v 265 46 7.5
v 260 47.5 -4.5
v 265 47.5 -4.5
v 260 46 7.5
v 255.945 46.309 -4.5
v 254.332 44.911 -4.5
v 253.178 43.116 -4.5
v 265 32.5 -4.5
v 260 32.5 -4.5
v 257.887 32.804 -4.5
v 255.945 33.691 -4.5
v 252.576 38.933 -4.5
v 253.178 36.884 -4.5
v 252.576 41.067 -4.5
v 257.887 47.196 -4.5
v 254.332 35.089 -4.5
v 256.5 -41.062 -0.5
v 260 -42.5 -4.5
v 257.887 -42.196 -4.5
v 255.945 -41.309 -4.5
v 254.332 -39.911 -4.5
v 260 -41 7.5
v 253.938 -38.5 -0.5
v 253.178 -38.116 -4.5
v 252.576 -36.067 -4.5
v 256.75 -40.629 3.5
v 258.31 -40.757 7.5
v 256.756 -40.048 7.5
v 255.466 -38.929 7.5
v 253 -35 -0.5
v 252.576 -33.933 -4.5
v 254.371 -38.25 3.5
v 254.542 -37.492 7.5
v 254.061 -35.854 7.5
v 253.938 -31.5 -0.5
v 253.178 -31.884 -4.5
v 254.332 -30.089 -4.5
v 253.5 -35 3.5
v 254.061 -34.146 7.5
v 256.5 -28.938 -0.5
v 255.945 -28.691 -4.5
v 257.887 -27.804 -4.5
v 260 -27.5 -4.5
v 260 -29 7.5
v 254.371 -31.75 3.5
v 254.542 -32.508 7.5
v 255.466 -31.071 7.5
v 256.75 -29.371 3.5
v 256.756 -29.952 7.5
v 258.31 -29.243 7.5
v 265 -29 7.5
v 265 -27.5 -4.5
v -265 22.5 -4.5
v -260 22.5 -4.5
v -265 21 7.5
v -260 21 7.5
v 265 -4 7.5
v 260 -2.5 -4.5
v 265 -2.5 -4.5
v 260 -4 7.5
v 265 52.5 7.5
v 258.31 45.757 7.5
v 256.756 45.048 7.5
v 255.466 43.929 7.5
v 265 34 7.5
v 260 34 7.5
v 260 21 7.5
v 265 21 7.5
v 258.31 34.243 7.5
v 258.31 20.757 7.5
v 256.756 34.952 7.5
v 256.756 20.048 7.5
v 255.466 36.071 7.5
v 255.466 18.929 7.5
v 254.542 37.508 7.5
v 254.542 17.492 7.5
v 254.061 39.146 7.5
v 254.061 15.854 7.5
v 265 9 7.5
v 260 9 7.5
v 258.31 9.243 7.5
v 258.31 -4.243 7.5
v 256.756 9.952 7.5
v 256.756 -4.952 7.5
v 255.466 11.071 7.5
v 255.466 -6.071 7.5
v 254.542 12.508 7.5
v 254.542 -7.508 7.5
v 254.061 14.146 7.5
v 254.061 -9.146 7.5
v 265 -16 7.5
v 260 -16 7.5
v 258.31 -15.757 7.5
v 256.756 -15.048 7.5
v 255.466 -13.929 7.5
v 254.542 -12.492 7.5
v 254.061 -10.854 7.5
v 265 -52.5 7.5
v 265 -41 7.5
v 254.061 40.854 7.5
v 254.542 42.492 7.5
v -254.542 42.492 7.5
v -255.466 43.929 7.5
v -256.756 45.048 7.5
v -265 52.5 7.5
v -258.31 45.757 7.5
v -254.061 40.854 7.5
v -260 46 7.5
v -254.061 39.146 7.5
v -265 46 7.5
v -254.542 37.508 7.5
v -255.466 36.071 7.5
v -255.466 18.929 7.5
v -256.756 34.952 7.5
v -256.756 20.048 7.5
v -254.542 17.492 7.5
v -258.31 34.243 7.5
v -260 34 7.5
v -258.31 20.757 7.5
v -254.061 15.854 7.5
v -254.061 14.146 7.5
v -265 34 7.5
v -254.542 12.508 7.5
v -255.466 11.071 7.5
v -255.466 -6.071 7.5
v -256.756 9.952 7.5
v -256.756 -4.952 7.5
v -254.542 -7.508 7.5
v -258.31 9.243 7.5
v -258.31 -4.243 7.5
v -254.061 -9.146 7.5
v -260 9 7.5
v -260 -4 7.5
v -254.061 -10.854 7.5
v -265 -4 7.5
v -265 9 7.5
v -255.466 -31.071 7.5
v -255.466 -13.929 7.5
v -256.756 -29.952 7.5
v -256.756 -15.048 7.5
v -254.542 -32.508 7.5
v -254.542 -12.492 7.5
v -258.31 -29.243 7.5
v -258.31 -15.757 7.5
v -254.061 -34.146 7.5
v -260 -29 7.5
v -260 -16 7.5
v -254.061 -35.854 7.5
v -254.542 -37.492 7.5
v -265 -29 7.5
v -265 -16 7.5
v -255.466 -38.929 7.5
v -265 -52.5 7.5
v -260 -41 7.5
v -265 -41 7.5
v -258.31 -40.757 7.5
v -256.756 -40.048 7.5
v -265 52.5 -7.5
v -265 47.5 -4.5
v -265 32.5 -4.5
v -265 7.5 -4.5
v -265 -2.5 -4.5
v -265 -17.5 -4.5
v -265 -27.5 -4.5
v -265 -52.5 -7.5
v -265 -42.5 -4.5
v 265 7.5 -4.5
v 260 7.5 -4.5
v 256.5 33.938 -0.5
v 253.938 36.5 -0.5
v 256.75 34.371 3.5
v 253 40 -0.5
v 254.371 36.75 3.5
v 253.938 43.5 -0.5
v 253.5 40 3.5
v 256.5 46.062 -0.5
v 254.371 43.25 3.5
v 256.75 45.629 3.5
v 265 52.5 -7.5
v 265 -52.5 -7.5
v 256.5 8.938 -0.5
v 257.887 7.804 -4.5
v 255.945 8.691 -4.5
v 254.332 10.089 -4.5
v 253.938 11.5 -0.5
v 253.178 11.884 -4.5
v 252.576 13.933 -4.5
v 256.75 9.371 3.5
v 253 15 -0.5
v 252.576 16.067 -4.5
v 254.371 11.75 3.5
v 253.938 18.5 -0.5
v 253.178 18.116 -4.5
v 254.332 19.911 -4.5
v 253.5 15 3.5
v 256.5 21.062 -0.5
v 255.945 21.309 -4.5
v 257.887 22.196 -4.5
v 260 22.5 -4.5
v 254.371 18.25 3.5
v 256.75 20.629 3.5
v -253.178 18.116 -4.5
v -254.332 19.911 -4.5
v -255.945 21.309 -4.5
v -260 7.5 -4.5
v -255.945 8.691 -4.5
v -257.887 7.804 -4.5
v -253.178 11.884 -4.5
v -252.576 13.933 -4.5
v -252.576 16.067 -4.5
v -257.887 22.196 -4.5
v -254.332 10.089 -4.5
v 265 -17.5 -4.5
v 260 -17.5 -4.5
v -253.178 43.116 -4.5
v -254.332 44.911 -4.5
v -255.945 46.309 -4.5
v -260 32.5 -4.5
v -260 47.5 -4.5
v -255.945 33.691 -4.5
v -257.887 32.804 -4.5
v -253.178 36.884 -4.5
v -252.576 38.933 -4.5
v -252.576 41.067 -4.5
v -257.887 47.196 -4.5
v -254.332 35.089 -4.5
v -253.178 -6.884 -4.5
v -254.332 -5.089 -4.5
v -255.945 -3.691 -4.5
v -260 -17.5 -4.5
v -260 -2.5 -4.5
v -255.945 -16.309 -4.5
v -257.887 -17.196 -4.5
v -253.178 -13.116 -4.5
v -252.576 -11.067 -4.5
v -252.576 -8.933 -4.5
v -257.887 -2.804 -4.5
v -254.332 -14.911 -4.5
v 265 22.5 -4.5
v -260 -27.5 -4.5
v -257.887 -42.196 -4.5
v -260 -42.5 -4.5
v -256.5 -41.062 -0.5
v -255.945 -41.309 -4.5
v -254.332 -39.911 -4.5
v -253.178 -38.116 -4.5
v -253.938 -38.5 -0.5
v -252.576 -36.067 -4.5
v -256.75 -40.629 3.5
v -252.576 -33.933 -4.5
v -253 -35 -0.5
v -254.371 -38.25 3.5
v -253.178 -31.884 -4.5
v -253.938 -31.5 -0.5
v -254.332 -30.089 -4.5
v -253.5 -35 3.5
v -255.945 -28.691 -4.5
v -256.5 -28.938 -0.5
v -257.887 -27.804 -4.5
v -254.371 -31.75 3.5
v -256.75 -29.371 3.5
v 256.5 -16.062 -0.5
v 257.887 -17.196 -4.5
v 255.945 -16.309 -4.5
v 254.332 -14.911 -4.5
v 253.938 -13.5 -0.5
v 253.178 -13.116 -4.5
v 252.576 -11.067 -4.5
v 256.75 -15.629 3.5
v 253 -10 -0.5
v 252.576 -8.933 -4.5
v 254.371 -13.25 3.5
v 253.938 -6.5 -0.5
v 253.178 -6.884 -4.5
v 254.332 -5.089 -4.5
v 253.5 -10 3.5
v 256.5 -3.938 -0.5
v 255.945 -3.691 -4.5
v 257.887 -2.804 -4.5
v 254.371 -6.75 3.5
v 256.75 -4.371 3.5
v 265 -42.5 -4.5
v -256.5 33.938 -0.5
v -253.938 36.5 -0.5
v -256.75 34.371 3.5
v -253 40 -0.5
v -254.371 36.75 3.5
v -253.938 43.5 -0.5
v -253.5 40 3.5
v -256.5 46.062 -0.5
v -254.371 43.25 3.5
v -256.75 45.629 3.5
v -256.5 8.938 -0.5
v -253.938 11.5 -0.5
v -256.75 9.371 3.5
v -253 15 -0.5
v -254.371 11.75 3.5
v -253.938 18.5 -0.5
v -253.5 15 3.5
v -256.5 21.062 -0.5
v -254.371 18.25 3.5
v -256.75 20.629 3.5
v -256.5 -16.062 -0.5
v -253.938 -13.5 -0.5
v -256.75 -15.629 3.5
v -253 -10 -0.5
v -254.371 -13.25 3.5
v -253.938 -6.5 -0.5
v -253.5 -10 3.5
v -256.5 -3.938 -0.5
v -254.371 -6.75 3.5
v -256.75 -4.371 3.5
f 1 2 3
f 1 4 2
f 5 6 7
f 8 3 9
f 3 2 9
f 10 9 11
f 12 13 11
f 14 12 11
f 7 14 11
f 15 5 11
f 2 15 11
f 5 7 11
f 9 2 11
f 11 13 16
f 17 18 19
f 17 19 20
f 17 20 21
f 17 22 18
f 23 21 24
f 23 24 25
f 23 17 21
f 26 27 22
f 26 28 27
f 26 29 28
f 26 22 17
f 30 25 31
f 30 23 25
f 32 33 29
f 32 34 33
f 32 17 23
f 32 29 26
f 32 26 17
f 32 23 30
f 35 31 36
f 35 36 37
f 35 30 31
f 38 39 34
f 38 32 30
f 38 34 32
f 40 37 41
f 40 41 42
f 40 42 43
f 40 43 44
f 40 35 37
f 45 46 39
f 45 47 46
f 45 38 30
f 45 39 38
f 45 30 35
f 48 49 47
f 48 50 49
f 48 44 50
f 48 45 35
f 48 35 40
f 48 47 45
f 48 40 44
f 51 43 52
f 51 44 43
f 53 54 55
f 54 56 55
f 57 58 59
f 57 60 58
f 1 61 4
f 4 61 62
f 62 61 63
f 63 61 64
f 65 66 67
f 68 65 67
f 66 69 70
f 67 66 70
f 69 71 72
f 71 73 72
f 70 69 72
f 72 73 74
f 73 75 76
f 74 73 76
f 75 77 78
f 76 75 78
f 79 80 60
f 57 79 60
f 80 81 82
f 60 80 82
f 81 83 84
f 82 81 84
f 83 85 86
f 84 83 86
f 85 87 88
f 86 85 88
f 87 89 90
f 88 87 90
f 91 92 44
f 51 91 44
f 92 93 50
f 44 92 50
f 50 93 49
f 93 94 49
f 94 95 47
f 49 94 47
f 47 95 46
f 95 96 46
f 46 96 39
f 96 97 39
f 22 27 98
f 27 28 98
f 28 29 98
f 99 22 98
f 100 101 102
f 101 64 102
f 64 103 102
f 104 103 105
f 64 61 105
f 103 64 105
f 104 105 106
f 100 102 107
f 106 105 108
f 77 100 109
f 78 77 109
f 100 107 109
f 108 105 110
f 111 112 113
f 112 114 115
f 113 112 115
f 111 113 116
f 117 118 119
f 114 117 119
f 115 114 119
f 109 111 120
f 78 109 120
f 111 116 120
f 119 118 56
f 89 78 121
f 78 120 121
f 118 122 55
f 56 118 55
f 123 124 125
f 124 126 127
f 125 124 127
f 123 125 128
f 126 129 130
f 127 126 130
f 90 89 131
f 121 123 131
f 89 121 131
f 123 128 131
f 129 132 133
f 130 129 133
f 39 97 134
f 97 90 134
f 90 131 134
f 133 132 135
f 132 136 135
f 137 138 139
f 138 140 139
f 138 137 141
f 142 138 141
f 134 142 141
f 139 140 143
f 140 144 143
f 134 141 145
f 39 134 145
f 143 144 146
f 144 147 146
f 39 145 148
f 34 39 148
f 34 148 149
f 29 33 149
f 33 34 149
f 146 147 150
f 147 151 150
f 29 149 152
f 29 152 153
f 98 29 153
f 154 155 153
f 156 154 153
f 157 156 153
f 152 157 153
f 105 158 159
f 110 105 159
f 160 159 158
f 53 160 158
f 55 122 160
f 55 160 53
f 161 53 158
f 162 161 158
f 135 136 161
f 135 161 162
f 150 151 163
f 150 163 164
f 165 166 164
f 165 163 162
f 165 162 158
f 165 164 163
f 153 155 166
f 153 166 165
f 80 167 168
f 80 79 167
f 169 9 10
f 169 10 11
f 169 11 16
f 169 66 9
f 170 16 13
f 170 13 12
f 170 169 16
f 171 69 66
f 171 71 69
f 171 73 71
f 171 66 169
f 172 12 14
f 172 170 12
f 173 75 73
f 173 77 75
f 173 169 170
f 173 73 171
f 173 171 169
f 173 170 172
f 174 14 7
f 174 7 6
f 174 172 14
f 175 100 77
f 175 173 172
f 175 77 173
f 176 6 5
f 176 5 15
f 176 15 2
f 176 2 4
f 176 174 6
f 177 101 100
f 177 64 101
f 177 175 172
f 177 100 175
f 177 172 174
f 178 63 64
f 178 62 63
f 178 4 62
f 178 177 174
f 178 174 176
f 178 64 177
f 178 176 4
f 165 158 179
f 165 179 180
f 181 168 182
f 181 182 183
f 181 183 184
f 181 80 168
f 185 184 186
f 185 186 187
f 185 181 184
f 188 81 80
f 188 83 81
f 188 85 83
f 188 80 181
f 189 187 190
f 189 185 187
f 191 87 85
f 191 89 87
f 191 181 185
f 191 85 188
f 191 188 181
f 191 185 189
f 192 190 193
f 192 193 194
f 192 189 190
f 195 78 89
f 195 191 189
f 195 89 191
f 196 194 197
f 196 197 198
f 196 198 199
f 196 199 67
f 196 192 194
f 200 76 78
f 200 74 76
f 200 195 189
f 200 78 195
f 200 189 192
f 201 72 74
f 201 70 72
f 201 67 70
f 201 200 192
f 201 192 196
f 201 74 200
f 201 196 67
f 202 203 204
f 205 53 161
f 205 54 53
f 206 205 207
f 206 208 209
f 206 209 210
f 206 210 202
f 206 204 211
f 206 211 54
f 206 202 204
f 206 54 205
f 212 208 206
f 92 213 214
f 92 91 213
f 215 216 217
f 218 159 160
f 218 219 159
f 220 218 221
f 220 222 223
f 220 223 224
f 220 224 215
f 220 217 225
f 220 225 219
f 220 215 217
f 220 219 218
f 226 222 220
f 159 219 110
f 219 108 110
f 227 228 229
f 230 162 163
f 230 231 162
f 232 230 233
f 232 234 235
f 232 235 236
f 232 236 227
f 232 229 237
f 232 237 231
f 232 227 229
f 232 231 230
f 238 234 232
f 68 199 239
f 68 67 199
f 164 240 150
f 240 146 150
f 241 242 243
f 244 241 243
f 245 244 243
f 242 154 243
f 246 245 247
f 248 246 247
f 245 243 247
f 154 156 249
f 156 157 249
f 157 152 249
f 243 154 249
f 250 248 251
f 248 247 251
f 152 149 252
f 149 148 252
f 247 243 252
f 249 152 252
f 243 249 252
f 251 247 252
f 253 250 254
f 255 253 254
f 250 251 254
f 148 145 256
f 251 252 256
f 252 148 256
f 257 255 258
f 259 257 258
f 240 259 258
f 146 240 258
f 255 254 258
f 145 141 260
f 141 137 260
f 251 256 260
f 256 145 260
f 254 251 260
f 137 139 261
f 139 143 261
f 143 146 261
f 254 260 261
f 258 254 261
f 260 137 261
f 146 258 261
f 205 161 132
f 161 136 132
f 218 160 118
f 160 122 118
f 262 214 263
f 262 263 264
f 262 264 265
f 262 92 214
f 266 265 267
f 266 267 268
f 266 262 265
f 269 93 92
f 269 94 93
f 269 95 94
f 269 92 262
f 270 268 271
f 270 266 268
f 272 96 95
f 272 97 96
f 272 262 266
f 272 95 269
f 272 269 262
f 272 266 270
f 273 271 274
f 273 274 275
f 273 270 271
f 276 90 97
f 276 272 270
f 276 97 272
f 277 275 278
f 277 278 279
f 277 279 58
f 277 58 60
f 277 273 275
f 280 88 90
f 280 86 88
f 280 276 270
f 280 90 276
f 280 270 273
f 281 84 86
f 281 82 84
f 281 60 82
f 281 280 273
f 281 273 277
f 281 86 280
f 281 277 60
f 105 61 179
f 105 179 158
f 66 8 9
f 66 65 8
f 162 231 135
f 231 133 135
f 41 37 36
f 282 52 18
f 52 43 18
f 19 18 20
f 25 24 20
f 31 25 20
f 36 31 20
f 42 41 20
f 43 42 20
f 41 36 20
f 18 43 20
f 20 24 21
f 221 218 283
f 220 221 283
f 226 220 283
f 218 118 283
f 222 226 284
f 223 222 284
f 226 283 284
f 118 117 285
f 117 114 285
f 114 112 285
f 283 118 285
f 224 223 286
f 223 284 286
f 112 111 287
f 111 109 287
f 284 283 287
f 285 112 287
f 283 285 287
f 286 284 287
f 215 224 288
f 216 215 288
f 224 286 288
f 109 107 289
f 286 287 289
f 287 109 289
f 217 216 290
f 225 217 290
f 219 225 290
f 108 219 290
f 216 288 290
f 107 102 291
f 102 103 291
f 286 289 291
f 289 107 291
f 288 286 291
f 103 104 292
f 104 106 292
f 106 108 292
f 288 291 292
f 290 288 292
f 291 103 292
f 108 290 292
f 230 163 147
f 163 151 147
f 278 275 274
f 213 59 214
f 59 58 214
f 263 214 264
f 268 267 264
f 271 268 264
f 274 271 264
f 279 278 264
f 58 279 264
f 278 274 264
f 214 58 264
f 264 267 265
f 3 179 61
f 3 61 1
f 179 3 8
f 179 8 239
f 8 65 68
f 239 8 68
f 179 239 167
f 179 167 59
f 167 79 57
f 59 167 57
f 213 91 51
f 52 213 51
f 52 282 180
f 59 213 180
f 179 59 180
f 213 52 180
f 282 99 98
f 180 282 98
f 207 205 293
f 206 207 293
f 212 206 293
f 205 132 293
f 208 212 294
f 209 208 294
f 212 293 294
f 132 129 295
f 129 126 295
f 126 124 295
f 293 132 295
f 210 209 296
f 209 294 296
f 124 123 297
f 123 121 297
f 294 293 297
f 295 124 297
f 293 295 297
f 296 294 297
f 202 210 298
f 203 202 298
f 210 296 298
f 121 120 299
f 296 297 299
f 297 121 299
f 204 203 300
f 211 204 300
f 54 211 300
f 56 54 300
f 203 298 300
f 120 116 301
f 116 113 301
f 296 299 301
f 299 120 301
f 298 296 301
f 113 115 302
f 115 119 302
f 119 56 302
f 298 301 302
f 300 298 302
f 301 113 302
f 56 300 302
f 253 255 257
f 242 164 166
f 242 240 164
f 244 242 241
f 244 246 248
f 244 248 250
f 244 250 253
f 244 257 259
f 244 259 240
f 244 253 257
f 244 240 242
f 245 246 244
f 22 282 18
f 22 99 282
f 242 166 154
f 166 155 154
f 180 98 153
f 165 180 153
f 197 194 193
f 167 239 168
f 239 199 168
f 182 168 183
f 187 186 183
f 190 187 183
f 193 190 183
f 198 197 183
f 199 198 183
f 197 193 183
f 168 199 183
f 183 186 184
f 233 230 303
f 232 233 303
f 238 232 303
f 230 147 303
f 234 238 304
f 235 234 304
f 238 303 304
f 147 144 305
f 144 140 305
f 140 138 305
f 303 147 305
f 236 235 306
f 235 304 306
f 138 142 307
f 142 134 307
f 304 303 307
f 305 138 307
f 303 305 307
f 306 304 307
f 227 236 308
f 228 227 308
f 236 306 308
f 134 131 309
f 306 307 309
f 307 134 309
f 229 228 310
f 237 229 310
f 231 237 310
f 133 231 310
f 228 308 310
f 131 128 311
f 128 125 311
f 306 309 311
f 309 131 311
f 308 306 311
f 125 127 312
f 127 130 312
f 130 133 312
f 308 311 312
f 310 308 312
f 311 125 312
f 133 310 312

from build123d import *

# Parameters (mm, degrees)
SKETCH1_W           = 105
SKETCH1_H           = 530
BOSS_EXTRUDE1_DEPTH = 7.5
LPATTERN1_COUNT     = 4
LPATTERN1_PITCH     = 25


# Read off the part's stored shape, not the designer's step: Mirror1
with BuildPart() as part:
    # Sketch1 → Boss-Extrude1 (new, symmetric)
    with BuildSketch(Plane(origin=(0, 0, 0), x_dir=(0, -1, 0), z_dir=(0, 0, 1))):
        Rectangle(SKETCH1_W, SKETCH1_H)
    extrude(amount=BOSS_EXTRUDE1_DEPTH, both=True)

    # Sketch2 → Cut-Loft1 section 0
    with BuildSketch(Plane.XY.offset(-4.5)):
        with BuildLine():
            Line((265, 47.5), (265, 32.5))
            Line((265, 32.5), (260, 32.5))
            ThreePointArc((260, 32.5), (252.5, 40), (260, 47.5))
            Line((260, 47.5), (265, 47.5))
        make_face()
    # Sketch3 → Cut-Loft1 section 1
    with BuildSketch(Plane.XY.offset(7.5)):
        with BuildLine():
            Line((265, 46), (265, 34))
            Line((265, 34), (260, 34))
            ThreePointArc((260, 34), (254, 40), (260, 46))
            Line((260, 46), (265, 46))
        make_face()
    cut_loft1 = loft(mode=Mode.SUBTRACT)

    # LPattern1: Cut-Loft1 ×4
    with Locations(*[(0, -i * LPATTERN1_PITCH, 0) for i in range(1, LPATTERN1_COUNT)]):
        add(cut_loft1, mode=Mode.SUBTRACT)

    # Mirror1
    split(bisect_by=Plane(origin=(0, 0, 0), x_dir=(0, 0, 1), z_dir=(1, 0, 0)), keep=Keep.TOP)

    # Mirror1 2: part across plane


with BuildPart() as part_1:
    add(part.part)
    add(part.part.mirror(Plane(origin=(0, 0, 0), x_dir=(0, 0, 1), z_dir=(1, 0, 0))))


solid = part_1.part
